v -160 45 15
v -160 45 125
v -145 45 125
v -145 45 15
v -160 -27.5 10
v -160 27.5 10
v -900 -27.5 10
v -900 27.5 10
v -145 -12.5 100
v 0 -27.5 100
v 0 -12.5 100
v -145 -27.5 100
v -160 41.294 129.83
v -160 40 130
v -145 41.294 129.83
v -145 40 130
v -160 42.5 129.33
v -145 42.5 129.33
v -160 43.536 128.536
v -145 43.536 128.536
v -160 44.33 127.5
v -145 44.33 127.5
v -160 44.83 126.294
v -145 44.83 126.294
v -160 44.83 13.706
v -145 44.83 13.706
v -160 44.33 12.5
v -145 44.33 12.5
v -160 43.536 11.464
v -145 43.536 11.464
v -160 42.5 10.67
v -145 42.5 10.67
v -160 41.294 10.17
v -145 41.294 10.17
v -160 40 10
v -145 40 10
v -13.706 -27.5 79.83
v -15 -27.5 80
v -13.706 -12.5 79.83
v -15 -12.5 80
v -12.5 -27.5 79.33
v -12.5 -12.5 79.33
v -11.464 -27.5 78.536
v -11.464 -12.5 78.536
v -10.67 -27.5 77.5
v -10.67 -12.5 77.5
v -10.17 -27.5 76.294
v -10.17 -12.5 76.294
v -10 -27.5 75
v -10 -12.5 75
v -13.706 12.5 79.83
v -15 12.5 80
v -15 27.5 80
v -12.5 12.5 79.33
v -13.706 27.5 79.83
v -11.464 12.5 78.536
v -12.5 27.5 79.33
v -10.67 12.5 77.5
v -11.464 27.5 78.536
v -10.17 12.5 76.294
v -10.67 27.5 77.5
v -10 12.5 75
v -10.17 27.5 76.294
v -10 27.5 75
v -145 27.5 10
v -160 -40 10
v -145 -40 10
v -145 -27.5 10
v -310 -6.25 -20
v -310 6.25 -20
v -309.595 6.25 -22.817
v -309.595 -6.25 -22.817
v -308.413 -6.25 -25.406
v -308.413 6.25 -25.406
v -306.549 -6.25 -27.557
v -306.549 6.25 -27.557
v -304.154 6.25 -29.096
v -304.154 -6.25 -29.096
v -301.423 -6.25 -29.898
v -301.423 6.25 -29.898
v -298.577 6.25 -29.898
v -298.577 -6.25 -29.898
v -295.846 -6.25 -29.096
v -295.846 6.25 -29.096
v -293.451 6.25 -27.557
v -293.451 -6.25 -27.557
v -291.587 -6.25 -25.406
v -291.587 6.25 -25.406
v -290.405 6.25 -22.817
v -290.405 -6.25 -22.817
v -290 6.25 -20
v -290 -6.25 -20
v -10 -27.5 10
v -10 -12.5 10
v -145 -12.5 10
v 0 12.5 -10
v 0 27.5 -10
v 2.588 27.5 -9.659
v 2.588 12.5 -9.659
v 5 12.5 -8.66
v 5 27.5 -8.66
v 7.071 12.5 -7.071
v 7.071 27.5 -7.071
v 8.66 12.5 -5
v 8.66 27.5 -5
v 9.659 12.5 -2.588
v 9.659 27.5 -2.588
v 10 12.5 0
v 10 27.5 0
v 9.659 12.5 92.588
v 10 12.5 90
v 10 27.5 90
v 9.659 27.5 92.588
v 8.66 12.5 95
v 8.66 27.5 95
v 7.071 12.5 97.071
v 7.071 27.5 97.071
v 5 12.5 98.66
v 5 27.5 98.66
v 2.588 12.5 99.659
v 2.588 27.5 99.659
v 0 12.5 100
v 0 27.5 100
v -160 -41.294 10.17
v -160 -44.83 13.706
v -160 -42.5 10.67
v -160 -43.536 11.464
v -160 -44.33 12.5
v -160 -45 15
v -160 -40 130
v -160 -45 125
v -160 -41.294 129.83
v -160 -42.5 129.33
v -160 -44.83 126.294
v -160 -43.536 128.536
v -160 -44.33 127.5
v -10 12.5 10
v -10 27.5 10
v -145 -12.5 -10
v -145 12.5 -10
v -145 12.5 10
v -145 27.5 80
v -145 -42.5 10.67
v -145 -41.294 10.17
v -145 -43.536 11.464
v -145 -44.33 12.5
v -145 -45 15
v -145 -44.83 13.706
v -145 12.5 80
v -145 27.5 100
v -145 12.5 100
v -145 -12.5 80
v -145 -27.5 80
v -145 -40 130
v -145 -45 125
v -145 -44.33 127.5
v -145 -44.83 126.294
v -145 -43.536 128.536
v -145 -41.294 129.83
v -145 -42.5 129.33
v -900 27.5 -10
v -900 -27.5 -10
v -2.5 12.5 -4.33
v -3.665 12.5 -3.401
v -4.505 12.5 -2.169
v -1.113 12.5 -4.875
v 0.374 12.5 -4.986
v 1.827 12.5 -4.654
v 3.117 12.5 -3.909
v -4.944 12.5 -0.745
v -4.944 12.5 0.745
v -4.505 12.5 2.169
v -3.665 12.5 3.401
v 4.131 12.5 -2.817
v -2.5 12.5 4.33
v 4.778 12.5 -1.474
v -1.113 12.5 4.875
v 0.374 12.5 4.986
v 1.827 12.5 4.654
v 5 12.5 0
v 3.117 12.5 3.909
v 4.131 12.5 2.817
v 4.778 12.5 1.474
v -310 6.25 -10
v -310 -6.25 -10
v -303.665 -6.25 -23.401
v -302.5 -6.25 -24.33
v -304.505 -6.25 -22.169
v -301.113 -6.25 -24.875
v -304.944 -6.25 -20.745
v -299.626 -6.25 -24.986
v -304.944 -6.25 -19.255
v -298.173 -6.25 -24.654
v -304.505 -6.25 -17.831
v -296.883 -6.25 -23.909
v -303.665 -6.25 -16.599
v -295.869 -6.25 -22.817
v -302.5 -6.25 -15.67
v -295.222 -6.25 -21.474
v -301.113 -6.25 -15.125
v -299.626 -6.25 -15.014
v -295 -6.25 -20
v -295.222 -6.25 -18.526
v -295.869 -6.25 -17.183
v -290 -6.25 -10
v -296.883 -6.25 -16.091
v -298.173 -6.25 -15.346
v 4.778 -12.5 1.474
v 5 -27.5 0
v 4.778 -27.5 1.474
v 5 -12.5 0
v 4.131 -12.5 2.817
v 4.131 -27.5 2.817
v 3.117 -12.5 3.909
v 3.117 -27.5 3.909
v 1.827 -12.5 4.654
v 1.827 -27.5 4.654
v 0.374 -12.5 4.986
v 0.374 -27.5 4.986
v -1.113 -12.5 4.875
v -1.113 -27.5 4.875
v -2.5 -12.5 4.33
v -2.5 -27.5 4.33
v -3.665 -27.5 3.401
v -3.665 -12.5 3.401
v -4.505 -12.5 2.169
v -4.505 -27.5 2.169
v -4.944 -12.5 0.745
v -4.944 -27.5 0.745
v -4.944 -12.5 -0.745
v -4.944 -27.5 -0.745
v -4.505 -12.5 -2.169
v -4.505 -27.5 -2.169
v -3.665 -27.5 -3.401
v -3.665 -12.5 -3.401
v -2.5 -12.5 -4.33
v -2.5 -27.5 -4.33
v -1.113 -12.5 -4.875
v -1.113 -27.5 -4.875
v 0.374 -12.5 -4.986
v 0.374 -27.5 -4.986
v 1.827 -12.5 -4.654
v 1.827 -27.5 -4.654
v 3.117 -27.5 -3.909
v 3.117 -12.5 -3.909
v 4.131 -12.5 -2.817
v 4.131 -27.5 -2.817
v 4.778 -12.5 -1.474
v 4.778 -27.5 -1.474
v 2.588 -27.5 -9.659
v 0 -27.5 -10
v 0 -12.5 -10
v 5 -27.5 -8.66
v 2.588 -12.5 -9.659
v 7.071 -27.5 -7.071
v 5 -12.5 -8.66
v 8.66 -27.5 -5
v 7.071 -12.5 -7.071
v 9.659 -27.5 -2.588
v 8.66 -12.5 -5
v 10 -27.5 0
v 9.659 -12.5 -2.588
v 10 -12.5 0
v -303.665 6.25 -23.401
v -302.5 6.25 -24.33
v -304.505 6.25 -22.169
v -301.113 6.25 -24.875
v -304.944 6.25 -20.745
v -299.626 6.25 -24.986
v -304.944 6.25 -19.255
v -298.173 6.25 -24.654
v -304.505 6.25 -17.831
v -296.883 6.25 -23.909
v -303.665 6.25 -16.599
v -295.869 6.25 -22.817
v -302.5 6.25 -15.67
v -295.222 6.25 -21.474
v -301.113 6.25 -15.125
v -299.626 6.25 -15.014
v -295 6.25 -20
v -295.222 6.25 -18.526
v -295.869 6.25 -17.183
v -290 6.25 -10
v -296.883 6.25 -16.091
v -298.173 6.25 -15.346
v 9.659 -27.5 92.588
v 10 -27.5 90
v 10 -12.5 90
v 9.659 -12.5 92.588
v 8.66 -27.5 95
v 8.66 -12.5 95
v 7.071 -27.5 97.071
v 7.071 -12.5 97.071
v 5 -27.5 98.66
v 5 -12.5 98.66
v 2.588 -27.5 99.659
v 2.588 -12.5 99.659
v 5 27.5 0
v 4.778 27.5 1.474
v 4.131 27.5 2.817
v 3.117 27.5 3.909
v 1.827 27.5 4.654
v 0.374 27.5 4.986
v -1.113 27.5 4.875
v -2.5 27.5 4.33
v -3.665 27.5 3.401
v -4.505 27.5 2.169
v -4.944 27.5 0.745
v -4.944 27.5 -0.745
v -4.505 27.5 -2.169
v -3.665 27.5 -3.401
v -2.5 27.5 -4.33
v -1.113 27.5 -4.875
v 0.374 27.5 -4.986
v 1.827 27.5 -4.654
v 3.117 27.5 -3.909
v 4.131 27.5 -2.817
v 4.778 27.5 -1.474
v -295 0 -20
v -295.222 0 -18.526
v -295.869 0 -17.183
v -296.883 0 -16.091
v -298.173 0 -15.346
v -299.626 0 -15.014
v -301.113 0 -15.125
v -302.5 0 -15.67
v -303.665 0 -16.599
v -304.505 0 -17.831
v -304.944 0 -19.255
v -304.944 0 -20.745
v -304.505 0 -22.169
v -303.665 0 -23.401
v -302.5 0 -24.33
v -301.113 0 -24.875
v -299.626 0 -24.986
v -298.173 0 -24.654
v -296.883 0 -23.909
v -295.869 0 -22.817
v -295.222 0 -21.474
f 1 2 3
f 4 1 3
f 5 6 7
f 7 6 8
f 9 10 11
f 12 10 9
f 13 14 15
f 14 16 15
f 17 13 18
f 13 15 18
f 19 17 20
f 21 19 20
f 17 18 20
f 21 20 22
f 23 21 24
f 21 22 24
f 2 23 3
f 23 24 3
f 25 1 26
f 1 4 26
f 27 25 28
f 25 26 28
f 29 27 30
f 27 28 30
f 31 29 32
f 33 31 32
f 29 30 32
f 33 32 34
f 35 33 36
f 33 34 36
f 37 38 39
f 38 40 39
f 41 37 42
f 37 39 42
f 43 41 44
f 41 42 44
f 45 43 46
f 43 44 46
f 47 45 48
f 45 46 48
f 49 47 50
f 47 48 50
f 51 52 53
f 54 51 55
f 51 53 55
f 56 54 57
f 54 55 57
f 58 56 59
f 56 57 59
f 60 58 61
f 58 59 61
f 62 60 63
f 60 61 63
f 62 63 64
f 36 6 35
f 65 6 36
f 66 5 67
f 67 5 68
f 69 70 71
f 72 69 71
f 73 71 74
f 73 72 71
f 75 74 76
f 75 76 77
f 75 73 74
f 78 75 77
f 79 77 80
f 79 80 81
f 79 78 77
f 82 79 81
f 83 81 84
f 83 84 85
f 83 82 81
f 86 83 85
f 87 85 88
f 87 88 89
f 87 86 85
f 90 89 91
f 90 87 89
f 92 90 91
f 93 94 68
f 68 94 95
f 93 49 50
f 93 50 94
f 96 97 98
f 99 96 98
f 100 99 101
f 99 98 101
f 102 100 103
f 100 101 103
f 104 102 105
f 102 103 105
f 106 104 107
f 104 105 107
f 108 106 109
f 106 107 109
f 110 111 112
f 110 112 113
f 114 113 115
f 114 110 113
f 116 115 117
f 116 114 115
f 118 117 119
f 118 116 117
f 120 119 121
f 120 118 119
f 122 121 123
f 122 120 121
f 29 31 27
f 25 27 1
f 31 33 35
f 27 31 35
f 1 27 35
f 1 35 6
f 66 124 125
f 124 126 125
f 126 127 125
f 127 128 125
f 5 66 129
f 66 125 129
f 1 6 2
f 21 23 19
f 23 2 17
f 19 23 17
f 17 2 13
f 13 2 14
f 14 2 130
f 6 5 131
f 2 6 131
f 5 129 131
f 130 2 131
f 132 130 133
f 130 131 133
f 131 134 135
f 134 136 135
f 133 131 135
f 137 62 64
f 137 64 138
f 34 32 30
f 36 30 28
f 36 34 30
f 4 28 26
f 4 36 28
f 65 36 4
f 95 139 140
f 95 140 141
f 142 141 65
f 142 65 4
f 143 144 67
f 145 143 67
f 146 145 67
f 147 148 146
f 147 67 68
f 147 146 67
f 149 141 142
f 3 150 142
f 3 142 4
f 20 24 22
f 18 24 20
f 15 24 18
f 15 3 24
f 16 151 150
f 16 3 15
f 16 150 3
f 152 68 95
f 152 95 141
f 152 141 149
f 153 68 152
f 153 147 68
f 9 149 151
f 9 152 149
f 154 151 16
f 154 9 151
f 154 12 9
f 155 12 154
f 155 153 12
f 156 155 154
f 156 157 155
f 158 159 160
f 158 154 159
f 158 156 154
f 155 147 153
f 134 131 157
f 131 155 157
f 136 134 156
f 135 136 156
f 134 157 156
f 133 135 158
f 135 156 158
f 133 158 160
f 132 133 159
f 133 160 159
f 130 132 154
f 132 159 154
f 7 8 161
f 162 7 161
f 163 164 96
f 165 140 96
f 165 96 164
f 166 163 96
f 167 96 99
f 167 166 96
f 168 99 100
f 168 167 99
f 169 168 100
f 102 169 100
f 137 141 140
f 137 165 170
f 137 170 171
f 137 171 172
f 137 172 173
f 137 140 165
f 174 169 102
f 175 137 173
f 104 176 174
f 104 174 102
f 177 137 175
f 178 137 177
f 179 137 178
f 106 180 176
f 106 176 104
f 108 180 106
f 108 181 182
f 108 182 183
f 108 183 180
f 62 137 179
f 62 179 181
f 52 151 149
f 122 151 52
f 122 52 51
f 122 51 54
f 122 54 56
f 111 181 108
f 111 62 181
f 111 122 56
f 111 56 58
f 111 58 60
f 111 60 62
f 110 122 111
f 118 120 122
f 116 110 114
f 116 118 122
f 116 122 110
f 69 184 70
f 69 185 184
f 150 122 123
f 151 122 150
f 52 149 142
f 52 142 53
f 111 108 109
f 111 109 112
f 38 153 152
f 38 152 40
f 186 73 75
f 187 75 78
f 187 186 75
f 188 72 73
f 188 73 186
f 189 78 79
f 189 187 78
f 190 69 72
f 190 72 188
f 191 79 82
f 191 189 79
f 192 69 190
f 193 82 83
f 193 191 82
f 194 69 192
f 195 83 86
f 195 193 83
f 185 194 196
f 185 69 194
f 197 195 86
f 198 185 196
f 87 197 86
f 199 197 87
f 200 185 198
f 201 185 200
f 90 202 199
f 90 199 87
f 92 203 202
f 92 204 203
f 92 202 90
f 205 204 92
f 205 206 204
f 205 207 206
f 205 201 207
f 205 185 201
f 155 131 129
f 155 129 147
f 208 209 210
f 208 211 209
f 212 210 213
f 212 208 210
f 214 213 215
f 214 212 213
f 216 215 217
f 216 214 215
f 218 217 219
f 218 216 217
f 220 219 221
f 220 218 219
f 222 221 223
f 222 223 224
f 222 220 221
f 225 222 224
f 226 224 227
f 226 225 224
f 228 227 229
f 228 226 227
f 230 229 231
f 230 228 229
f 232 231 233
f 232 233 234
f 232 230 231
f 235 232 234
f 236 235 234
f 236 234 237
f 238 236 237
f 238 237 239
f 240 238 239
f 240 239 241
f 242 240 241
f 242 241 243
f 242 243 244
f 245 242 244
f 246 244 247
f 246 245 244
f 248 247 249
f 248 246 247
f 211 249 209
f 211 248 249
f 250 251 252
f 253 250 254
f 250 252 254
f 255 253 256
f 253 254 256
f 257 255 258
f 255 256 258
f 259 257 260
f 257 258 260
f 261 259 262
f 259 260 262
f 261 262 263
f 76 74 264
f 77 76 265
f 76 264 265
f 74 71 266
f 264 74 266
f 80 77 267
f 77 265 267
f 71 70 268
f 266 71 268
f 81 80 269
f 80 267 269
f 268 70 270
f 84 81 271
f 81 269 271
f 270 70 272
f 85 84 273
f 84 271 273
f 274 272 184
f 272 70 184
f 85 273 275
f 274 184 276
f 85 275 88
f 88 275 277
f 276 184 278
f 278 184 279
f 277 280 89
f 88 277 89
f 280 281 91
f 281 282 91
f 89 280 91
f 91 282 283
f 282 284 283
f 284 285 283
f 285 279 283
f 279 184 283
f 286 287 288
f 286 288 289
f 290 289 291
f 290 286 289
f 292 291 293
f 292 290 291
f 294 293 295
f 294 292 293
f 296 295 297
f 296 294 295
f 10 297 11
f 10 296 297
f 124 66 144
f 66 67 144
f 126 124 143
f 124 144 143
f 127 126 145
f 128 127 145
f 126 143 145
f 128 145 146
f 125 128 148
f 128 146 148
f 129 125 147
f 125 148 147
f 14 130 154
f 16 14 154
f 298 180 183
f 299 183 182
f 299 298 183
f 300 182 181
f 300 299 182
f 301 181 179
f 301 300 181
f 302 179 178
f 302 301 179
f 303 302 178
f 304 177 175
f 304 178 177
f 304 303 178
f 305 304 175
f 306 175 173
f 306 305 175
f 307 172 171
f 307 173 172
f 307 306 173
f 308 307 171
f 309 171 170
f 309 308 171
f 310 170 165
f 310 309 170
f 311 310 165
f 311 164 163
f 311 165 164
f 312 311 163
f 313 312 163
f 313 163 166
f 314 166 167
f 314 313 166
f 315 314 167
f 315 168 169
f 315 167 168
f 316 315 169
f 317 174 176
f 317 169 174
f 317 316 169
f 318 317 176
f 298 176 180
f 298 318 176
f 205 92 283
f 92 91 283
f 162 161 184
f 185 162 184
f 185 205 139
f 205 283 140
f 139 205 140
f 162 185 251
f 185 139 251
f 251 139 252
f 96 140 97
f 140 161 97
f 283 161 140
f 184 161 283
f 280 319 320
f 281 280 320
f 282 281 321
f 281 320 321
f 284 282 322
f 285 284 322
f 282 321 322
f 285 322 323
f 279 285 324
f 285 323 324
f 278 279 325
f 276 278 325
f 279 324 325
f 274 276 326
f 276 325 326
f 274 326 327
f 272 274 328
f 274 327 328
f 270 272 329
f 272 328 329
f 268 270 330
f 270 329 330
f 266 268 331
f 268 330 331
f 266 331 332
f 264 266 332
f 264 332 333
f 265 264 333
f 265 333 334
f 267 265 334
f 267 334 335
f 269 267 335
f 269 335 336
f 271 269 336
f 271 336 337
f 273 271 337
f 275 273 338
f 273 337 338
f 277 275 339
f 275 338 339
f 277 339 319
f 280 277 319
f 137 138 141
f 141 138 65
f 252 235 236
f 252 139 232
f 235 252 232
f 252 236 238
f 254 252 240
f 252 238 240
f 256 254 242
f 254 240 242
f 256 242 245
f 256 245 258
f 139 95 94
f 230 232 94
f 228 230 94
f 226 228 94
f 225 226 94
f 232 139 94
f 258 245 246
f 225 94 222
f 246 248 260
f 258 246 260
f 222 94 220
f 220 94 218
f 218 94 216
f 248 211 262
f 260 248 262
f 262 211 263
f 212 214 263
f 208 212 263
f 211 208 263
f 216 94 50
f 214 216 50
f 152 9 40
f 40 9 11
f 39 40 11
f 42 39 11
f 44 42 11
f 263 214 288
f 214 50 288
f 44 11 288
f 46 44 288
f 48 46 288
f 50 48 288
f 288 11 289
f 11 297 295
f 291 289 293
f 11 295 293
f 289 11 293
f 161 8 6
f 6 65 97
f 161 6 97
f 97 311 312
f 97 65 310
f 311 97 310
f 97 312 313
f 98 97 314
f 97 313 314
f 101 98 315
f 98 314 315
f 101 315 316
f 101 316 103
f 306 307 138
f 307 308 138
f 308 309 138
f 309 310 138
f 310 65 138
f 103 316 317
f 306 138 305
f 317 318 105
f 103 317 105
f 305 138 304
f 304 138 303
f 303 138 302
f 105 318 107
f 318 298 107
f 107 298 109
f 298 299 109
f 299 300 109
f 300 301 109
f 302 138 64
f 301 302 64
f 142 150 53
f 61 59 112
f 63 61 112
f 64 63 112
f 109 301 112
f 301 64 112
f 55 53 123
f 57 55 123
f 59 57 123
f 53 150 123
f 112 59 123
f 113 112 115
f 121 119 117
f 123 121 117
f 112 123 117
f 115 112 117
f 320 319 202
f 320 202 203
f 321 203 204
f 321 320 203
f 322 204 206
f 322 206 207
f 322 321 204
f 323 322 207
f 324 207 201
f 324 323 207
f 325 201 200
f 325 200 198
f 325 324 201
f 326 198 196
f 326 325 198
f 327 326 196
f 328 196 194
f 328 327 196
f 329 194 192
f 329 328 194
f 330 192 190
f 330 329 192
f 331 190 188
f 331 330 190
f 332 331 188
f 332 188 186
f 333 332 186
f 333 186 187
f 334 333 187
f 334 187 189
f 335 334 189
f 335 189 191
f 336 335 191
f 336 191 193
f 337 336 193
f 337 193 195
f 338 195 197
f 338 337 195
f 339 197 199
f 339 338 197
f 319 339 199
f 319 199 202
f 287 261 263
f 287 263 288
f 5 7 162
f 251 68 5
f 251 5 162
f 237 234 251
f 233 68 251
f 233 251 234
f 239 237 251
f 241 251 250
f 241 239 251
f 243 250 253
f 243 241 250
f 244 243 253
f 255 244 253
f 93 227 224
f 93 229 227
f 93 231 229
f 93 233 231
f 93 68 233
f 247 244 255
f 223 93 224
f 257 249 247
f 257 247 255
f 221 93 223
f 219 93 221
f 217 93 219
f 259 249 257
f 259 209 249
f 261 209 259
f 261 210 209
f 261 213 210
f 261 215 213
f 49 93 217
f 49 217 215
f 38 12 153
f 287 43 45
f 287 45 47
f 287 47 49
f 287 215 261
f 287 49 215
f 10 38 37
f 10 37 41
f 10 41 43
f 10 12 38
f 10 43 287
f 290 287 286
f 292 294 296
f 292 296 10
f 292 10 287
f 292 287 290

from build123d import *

# Parameters (mm, degrees)
F0_R           = 5
F1_DEPTH       = 27.5
F1_DEPTH_BACK  = 27.5
F4_R           = 5
F5_DEPTH       = 55
F6_W           = 175
F6_H           = 126.1557921569
F7_DEPTH       = 12.5
F7_DEPTH_BACK  = 12.5
F8_R           = 5
F9_DEPTH       = 6.25
F9_DEPTH_BACK  = 6.25
F10_W          = 15
F10_H          = 120
F11_DEPTH      = 45
F11_DEPTH_BACK = 45
F12_R          = 5
F13_R          = 5


with BuildPart() as f1:
    # F0 (on Front) → F1 (new body, two sides)
    with BuildSketch(Plane.XZ) as f1_sk:
        with BuildLine():
            Line((-900, -10), (0, -10))
            ThreePointArc((0, -10), (10, 0), (0, 10))
            Line((0, 10), (-900, 10))
            Line((-900, 10), (-900, -10))
        make_face()
        Circle(F0_R, mode=Mode.SUBTRACT)
    extrude(amount=-F1_DEPTH)
    extrude(f1_sk.sketch, amount=F1_DEPTH_BACK)

    # F4 (on offset) → F5 (join)
    with BuildSketch(Plane.XZ.offset(27.5)):
        with BuildLine():
            Line((-10, 80), (-10, 0))
            ThreePointArc((-10, 0), (0, -10), (10, 0))
            Line((10, 0), (10, 90))
            ThreePointArc((10, 90), (7.0710678119, 97.0710678119), (0, 100))
            Line((0, 100), (-145, 100))
            Line((-145, 100), (-145, 80))
            Line((-145, 80), (-10, 80))
        make_face()
        Circle(F4_R, mode=Mode.SUBTRACT)
    extrude(amount=-F5_DEPTH)

    # F6 (on offset) → F7 (cut, two sides)
    with BuildSketch(Plane.XZ) as f7_sk:
        with Locations((-57.5, 44.8381894321)):
            Rectangle(F6_W, F6_H)
    extrude(amount=-F7_DEPTH, mode=Mode.SUBTRACT)
    extrude(f7_sk.sketch, amount=F7_DEPTH_BACK, mode=Mode.SUBTRACT)

    # F8 (on offset) → F9 (join, two sides)
    with BuildSketch(Plane.XZ) as f9_sk:
        with BuildLine():
            Line((-310, -10), (-310, -20))
            ThreePointArc((-310, -20), (-300, -30), (-290, -20))
            Line((-290, -20), (-290, -10))
            Line((-290, -10), (-300, -10))
            Line((-300, -10), (-310, -10))
        make_face()
        with Locations((-300, -20)):
            Circle(F8_R, mode=Mode.SUBTRACT)
    extrude(amount=F9_DEPTH)
    extrude(f9_sk.sketch, amount=-F9_DEPTH_BACK)

    # F10 (on offset) → F11 (join, two sides)
    with BuildSketch(Plane.XZ) as f11_sk:
        with Locations((-152.5, 70)):
            Rectangle(F10_W, F10_H)
    extrude(amount=F11_DEPTH)
    extrude(f11_sk.sketch, amount=-F11_DEPTH_BACK)

    # F12
    f12_edges = [f1.edges().sort_by_distance(p)[0] for p in [
        (-152.5, -45, 130),
        (-152.5, 45, 130),
        (-152.5, -45, 10),
        (-152.5, 45, 10),
    ]]
    fillet(f12_edges, radius=F12_R)

    # F13
    f13_edges = [f1.edges().sort_by_distance(p)[0] for p in [
        (-10, -20, 80),
        (-10, 20, 80),
    ]]
    fillet(f13_edges, radius=F13_R)


solid = f1.part
